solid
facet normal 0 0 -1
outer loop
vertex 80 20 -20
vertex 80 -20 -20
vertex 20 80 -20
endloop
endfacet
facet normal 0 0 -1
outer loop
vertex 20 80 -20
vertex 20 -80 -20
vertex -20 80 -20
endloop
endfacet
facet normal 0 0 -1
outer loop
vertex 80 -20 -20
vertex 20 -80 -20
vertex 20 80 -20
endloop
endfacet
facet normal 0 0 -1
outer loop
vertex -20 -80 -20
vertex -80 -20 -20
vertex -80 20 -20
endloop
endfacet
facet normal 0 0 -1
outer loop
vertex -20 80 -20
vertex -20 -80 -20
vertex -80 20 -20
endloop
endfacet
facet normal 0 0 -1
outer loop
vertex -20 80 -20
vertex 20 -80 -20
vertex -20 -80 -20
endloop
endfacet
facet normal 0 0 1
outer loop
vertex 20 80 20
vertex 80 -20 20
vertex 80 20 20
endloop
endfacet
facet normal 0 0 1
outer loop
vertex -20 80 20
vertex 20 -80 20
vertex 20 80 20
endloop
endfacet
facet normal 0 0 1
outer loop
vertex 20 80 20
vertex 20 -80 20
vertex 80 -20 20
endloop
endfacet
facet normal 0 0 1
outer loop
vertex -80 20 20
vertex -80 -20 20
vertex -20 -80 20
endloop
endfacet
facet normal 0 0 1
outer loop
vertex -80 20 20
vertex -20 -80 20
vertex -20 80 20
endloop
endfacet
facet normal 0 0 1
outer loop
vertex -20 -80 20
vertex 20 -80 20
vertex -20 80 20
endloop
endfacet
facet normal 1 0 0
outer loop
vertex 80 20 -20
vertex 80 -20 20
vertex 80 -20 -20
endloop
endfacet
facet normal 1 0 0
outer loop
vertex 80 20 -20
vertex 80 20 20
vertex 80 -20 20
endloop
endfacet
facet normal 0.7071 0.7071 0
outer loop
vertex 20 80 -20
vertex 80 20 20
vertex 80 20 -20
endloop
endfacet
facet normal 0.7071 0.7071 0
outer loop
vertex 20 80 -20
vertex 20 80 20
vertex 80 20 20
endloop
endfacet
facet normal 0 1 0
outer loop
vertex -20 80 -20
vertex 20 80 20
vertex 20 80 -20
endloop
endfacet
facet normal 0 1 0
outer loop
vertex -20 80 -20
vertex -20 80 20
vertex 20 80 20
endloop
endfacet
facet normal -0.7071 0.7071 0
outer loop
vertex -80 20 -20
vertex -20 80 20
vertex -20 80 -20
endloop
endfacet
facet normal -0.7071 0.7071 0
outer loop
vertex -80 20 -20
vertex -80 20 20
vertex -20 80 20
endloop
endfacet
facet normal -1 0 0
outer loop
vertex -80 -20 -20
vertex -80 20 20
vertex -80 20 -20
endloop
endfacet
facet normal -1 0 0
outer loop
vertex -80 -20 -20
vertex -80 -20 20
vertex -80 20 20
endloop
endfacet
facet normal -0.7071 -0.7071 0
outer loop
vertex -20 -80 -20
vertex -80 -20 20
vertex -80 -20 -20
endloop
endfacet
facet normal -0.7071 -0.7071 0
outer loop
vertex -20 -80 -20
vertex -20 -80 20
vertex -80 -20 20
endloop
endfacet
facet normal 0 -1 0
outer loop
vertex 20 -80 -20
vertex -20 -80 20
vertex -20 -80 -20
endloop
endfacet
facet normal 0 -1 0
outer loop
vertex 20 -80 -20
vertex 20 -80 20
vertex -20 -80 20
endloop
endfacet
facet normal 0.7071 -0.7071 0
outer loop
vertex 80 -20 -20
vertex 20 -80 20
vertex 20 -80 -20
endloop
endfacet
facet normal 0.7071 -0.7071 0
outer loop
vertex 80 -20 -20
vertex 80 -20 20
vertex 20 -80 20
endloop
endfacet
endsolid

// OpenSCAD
linear_extrude(height = 40, center = true, convexity = 10, twist = 0) 
{
    intersection() {
        polygon(points=[[0,-100],[100,0],[0,100],[-100,0]]);
        square(size=160, center=true);
    }
}
